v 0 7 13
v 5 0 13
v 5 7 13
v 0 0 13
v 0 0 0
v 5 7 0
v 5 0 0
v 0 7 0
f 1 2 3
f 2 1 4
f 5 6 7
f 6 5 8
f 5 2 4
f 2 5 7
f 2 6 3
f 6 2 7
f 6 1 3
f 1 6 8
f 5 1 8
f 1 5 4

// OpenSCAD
// Generated by SolidPython 1.0.1 on 2020-07-29 00:39:26


cube(size = [5, 7, 13]);
/***********************************************
*********      SolidPython code:      **********
************************************************
 
# import packages: SolidPython
from solid import *
from solid.utils import *
from itertools import chain, combinations


class Resize:

    def __init__(self, scad_file):
        self.scad_file = scad_file
        #self.scad_file = import_scad(scad_file)
        # cone/cylinder param:
        self.r1 = 0
        self.r2 = 0
        self.h = 0
        # rectangular prism param:
        self.w = 0
        self.l = 0
        # ellipse param:
        self.r = 0

    # import OpenScad code (file name corresponds to shape)


    # classify shape + parameters
    def assign(self, param1, param2, param3):
        if self.scad_file == 'cone.scad':
            self.r1 = param1
            self.r2 = param2
            self.h = param3
        elif self.scad_file == 'cylinder.scad':
            self.r1 = param1
            self.r2 = param2
            self.h = param3
        elif self.scad_file == 'rectangularPrism.scad':
            self.h = param1
            self.l = param2
            self.w = param3
        else:
            self.r = param1
            self.h = param2

    # resize parameters
    def iterate(self):
        x = range(3, 20, 2)
        i = 1
        if self.scad_file == 'cone.scad':
            tempList = list(combinations(x, 2))
            for temp in tempList:
                param1 = temp[0]
                param2 = temp[1]
                filepath = 'produced_scad_files/' + 'cone' + str(param1) + '_' + str(param2) + '_' + '.scad'
                scad_render_to_file(cylinder(h=param1, r1=param2, r2=0), filepath)

        elif self.scad_file == 'cylinder.scad':
            tempList = list(combinations(x, 3))
            for temp in tempList:
                param1 = temp[0]
                param2 = temp[1]
                filepath = 'produced_scad_files/' + 'cylinder' + str(param1) + '_' + str(param2) + '_' + '.scad'
                scad_render_to_file(cylinder(h=param1, r1=param2, r2=param2), filepath)

        elif self.scad_file == 'rectangularPrism.scad':
            tempList = list(combinations(x, 3))
            for temp in tempList:
                param1 = temp[0]
                param2 = temp[1]
                param3 = temp[2]
                filepath = 'produced_scad_files/' + 'rectangularPrism' + str(param1) + '_' + str(param2) + '_' + str(
                    param3) + '.scad'
                scad_render_to_file(cube(size=(param1, param2, param3)), filepath)

        elif self.scad_file == 'ellipse.scad':
            tempList = list(combinations(x, 4))
            for temp in tempList:
                param1 = temp[0]
                param2 = temp[1]
                param3 = temp[2]
                param4 = temp[3]
                filepath = 'produced_scad_files/' + 'ellipse' + str(param1) + '_' + str(param2) + '_' + str(param3) + '_' + str(param4) + '.scad'
                scad_render_to_file(scale([param1, param2, param3])(sphere(r=param4)), filepath)

    def render_to_scadfile(self):
        scad_render_to_file(scad, 'example.scad') 
 
************************************************/
